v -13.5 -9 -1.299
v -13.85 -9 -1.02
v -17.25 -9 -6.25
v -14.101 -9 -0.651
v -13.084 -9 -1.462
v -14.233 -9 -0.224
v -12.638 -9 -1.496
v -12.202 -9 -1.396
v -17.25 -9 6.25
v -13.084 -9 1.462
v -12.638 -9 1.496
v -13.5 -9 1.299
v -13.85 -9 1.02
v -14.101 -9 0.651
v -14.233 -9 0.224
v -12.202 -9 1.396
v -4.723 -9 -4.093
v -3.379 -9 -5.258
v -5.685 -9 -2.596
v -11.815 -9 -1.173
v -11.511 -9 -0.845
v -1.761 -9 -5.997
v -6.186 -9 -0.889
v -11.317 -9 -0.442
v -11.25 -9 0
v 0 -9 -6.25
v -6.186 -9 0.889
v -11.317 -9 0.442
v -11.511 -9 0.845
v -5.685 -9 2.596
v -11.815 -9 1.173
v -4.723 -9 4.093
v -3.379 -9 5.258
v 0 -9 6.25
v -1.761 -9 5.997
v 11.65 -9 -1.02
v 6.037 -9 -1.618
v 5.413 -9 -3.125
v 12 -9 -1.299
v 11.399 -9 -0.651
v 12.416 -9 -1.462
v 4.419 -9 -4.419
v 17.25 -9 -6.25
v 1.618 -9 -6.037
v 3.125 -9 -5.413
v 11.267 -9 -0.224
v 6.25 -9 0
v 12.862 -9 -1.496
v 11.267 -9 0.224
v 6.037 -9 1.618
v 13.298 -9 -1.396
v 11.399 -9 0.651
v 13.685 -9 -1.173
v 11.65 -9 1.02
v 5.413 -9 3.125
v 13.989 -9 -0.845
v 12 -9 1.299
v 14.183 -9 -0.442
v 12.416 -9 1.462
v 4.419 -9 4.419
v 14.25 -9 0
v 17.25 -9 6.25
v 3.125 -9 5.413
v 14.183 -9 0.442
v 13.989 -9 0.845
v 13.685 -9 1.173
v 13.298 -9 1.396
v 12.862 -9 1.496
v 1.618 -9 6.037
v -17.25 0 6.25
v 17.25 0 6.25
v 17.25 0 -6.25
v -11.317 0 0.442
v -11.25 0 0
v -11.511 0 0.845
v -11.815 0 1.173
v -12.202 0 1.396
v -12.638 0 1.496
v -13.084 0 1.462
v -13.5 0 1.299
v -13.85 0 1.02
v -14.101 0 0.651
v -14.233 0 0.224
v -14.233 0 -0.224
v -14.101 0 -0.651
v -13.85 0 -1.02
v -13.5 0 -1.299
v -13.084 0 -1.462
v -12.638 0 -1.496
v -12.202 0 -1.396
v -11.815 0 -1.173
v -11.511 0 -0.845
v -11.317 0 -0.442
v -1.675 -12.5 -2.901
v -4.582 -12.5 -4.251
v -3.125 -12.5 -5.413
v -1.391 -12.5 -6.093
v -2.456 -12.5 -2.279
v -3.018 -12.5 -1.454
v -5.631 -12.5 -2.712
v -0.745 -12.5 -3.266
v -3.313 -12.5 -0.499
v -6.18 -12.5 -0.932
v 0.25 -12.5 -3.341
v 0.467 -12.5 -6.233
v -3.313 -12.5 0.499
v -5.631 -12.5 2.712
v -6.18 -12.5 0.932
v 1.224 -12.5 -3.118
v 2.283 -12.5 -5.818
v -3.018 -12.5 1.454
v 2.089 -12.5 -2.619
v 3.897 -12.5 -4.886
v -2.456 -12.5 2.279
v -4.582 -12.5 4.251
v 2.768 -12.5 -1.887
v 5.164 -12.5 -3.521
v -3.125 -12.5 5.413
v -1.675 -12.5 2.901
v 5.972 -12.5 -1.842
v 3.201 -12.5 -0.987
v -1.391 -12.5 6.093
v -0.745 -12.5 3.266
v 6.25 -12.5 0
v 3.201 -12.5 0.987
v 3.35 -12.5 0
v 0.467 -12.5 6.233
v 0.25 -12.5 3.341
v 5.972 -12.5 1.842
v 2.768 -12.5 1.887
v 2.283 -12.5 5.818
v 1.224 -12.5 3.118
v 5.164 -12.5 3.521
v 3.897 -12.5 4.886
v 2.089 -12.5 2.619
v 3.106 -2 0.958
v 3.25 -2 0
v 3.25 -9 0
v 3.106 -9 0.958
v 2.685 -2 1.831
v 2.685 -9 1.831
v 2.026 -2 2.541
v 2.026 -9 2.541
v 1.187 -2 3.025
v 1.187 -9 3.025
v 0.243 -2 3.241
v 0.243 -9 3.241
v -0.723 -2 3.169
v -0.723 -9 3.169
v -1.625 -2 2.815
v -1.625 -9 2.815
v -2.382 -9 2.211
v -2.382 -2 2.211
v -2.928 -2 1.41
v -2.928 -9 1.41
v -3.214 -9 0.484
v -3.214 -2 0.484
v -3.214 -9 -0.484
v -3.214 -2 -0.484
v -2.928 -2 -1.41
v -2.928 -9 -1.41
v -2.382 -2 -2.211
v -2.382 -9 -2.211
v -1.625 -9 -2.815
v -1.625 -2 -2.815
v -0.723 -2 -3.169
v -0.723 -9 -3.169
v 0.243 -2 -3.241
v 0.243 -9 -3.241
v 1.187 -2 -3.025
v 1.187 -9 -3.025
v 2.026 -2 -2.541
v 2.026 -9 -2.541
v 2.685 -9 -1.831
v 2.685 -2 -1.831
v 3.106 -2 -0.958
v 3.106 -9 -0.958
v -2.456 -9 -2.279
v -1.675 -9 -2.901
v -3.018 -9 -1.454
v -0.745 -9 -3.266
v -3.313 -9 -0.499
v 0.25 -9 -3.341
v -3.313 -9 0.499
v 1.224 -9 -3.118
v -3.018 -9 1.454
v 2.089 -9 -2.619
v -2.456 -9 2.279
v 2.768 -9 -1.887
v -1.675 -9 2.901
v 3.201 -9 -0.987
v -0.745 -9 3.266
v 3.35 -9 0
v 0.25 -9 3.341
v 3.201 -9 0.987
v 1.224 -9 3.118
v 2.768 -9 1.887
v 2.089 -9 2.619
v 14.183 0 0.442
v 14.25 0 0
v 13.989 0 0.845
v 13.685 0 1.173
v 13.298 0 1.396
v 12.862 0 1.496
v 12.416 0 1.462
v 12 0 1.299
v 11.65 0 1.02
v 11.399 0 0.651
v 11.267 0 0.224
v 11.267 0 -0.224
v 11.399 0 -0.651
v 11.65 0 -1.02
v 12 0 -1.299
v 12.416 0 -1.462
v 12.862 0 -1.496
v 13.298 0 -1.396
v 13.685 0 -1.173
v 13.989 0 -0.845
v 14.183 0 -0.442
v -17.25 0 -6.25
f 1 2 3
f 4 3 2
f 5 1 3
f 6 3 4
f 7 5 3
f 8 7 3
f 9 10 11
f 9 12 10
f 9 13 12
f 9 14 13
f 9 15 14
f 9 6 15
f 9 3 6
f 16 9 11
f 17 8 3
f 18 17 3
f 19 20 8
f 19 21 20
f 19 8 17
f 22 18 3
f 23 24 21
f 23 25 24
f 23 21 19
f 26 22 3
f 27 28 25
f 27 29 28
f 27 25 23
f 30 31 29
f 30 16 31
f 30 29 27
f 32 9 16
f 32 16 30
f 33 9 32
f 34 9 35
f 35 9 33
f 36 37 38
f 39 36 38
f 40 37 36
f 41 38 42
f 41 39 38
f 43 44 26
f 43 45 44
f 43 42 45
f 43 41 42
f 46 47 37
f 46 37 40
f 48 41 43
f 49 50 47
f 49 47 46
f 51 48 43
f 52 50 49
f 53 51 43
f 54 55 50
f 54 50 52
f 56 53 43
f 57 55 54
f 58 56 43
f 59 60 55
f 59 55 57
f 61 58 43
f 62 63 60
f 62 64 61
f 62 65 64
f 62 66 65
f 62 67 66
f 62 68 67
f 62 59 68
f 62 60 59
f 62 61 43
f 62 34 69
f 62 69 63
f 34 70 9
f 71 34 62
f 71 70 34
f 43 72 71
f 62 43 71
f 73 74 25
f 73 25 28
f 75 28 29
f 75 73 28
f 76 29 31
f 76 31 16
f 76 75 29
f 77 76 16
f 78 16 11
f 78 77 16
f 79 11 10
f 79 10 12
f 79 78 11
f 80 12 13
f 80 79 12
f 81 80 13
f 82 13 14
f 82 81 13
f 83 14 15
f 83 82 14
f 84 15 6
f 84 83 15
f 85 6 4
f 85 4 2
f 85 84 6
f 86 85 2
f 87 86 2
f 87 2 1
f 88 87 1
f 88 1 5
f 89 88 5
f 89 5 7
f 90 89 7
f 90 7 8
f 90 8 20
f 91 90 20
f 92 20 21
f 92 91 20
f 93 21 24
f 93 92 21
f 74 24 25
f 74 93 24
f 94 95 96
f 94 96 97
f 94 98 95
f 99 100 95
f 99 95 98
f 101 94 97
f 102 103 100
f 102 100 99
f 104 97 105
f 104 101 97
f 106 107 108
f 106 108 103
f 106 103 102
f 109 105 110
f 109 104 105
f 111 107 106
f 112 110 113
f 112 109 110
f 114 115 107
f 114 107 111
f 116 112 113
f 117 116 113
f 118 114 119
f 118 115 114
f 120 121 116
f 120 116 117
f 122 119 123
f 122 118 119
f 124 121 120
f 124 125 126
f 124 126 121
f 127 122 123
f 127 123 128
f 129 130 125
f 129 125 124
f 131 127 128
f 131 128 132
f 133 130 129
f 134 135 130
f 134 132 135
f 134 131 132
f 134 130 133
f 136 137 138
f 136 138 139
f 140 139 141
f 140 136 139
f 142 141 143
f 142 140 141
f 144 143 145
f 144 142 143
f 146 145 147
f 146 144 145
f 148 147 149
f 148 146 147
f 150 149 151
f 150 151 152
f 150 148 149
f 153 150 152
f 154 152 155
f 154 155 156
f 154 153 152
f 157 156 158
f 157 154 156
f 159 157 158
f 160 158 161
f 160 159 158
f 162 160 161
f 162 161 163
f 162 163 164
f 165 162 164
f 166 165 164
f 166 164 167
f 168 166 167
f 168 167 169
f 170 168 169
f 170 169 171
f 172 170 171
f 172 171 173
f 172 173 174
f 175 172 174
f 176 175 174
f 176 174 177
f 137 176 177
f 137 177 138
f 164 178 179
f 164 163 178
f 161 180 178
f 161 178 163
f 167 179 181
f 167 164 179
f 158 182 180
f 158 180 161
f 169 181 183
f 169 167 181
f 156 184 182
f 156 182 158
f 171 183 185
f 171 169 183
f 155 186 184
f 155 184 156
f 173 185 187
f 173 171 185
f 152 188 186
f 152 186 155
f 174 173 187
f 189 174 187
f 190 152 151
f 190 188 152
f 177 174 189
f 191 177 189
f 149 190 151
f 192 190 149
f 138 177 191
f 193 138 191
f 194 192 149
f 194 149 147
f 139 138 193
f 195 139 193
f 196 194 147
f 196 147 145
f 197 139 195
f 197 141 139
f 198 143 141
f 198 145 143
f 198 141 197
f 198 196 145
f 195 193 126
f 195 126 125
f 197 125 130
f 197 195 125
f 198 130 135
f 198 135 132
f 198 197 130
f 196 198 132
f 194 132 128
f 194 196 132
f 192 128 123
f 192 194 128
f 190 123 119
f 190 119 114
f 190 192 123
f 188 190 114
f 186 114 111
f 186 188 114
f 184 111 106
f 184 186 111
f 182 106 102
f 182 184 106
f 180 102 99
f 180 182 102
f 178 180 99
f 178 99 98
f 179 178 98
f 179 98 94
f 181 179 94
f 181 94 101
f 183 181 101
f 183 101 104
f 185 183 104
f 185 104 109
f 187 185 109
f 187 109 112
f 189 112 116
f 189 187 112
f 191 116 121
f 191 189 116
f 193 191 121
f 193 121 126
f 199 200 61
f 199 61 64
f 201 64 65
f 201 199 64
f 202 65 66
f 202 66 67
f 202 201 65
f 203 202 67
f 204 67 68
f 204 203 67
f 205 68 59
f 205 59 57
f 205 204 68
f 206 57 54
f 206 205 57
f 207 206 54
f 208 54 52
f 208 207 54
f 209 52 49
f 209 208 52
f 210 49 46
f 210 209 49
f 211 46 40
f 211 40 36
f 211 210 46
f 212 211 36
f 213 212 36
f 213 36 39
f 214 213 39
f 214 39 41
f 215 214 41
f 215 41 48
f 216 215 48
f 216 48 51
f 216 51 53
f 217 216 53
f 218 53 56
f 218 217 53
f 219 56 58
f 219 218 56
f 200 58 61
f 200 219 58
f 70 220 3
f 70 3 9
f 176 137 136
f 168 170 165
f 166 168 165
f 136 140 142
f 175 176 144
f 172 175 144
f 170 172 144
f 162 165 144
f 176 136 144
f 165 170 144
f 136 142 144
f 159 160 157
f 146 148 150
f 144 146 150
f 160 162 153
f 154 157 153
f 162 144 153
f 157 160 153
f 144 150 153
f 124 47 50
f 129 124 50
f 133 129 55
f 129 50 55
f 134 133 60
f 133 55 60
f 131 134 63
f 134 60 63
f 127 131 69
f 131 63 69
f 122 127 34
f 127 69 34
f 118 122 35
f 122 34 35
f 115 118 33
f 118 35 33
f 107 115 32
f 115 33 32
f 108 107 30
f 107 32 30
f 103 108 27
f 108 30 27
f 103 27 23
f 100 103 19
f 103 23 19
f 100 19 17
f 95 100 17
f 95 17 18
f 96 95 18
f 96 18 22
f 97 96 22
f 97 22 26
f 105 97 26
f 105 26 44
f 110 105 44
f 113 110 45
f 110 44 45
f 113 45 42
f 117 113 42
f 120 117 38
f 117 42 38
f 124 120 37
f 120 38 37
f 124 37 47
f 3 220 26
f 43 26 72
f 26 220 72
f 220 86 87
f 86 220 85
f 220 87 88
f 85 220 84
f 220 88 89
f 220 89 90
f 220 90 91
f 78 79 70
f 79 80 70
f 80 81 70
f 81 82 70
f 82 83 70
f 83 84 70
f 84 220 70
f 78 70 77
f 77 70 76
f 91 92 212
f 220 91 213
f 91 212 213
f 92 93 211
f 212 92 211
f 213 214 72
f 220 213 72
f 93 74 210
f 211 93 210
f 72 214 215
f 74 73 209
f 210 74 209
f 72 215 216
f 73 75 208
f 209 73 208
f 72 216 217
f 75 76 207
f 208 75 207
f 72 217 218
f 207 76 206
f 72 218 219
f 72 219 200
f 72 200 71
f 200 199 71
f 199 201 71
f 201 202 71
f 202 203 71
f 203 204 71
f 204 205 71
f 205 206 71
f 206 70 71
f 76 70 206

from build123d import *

# Parameters (mm, degrees)
F0_W     = 34.5
F0_H     = 12.5
F0_R     = 1.5
F0_R_2   = 3.25
F1_DEPTH = 9
F2_R     = 6.25
F2_R_2   = 3.35
F3_DEPTH = 3.5
F4_W     = 10.950644
F4_H     = 8.111588
F5_DEPTH = 2


with BuildPart() as f1:
    # F0 (on Front) → F1 (new body)
    with BuildSketch(Plane.XZ):
        Rectangle(F0_W, F0_H)
        with Locations((-12.75, 0)):
            Circle(F0_R, mode=Mode.SUBTRACT)
        Circle(F0_R_2, mode=Mode.SUBTRACT)
        with Locations((12.75, 0)):
            Circle(F0_R, mode=Mode.SUBTRACT)
    extrude(amount=F1_DEPTH)

    # F2 (on face) → F3 (join)
    with BuildSketch(Plane.XZ.offset(9)):
        Circle(F2_R)
        Circle(F2_R_2, mode=Mode.SUBTRACT)
    extrude(amount=F3_DEPTH)

    # F4 (on face) → F5 (join)
    with BuildSketch(Plane(origin=(0, 0, 0), x_dir=(-1, 0, 0), z_dir=(0, 1, 0))):
        Rectangle(F4_W, F4_H)
    extrude(amount=-F5_DEPTH)


solid = f1.part
